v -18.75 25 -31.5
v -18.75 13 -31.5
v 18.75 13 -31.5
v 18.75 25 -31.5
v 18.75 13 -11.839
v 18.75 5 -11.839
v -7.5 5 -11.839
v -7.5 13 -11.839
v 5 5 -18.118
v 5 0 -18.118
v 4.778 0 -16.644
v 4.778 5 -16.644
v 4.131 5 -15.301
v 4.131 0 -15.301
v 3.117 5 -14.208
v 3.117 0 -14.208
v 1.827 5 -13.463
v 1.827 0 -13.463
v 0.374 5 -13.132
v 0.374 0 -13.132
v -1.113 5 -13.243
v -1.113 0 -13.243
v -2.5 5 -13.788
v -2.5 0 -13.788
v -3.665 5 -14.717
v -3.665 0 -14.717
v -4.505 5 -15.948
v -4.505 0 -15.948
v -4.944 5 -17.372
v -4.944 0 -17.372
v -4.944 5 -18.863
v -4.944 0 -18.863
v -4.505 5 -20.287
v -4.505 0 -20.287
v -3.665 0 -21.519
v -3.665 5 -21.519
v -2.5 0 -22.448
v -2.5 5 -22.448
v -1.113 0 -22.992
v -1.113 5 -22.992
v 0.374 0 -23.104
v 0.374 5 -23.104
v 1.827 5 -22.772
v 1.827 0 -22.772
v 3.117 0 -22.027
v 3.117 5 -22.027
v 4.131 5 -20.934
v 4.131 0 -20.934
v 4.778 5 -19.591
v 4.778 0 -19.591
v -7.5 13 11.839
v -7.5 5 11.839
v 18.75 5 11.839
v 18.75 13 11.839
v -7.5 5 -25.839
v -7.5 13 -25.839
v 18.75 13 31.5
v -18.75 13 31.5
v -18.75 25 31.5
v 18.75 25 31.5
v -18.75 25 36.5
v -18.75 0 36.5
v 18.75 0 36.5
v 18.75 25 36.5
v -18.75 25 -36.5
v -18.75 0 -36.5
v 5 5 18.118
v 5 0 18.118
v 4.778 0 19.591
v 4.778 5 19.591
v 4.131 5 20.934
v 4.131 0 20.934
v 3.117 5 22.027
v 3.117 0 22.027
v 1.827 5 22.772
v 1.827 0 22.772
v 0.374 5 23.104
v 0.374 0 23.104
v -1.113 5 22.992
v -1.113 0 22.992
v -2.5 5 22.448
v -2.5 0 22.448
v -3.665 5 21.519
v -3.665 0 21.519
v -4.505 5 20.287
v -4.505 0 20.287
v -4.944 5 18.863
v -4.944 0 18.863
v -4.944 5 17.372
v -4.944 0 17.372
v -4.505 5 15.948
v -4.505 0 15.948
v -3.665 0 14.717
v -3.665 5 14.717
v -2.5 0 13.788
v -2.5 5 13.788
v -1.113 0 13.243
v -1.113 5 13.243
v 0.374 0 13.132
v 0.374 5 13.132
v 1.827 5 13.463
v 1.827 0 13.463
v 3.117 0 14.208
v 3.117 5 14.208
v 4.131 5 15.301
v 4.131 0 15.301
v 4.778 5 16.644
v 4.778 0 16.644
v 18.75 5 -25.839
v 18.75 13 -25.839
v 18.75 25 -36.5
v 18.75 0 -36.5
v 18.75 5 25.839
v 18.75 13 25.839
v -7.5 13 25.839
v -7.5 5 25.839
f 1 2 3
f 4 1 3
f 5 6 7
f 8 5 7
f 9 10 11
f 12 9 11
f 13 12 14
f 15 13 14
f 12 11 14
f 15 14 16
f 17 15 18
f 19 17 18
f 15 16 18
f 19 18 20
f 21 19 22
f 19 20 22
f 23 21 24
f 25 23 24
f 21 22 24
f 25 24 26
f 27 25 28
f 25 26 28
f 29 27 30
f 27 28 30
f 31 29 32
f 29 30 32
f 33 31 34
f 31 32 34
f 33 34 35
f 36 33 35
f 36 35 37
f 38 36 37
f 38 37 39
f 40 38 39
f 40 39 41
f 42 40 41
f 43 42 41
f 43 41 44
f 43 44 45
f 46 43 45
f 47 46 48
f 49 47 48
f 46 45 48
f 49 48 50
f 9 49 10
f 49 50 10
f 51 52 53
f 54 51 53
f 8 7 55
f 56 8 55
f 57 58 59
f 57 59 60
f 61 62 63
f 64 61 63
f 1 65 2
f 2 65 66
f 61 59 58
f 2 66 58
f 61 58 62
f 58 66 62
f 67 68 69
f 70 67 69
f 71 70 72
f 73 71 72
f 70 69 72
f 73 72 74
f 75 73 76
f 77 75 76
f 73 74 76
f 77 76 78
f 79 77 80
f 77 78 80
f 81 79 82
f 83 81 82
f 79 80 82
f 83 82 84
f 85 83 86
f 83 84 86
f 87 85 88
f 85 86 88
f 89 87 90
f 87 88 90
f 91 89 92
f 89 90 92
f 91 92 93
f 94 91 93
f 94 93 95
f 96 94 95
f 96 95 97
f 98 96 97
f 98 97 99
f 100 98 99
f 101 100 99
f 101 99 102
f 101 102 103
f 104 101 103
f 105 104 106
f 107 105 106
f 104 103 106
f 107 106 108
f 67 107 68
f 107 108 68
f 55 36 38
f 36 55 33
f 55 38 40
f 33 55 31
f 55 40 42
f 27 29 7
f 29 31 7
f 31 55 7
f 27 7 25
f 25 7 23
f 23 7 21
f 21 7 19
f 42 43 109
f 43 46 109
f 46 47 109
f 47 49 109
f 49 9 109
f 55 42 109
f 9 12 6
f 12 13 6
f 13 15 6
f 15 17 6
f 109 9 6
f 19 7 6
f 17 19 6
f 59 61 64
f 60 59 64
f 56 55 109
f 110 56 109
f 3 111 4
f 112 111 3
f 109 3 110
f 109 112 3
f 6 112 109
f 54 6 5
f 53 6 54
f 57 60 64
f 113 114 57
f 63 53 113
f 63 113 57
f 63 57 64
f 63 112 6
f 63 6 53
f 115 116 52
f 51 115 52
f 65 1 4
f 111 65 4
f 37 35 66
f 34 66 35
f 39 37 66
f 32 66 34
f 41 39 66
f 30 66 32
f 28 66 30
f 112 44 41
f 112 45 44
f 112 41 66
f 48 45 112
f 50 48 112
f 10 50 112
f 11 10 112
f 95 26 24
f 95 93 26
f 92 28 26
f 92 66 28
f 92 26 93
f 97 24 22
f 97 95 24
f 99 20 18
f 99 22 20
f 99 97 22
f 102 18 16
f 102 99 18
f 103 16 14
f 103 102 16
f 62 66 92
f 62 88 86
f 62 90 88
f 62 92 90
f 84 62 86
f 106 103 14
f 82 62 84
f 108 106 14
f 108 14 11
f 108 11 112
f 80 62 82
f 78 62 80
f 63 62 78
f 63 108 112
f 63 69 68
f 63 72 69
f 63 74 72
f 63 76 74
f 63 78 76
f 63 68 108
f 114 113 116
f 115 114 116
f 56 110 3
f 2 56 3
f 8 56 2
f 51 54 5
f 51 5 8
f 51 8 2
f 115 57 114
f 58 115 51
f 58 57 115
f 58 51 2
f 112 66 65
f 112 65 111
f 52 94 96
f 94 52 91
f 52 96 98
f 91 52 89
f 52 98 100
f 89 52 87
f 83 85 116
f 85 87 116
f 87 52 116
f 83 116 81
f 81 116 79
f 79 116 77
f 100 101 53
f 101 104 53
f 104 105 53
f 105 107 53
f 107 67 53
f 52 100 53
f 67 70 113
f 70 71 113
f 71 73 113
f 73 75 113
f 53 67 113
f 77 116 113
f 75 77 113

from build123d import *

# Parameters (mm, degrees)
F0_W      = 37.5
F0_H      = 63
F3_DEPTH  = 5
F5_DEPTH  = 8
F6_W      = 37.5
F6_H      = 5
F7_DEPTH  = 25
F8_W      = 37.5
F8_H      = 5
F9_DEPTH  = 25
F1_R      = 5
F10_DEPTH = 5


with BuildPart() as f3:
    # F0 (on Front) → F3 (new body)
    with BuildSketch(Plane.XZ):
        Rectangle(F0_W, F0_H)
    extrude(amount=-F3_DEPTH)

    # F4 (on face) → F5 (join)
    with BuildSketch(Plane(origin=(0, 5, 0), x_dir=(-1, 0, 0), z_dir=(0, 1, 0))):
        Polygon((7.5, 11.838892), (0, 11.838892), (-18.75, 11.838892), (-18.75, -11.838892), (0, -11.838892), (7.5, -11.838892), (7.5, -25.838892), (0, -25.838892), (-18.75, -25.838892), (-18.75, -31.5), (18.75, -31.5), (18.75, 31.5), (-18.75, 31.5), (-18.75, 25.838892), (0, 25.838892), (7.5, 25.838892), align=None)
    extrude(amount=F5_DEPTH)

    # F6 (on Front) → F7 (join)
    with BuildSketch(Plane.XZ):
        with Locations((0, 34)):
            Rectangle(F6_W, F6_H)
    extrude(amount=-F7_DEPTH)

    # F8 (on Front) → F9 (join)
    with BuildSketch(Plane.XZ):
        with Locations((0, -34)):
            Rectangle(F8_W, F8_H)
    extrude(amount=-F9_DEPTH)

    # F1 (on face) → F10 (cut)
    with BuildSketch(Plane.XZ):
        with Locations((0, 18.117641)):
            Circle(F1_R)
        with Locations((0, -18.117641)):
            Circle(F1_R)
    extrude(amount=-F10_DEPTH, mode=Mode.SUBTRACT)


solid = f3.part
